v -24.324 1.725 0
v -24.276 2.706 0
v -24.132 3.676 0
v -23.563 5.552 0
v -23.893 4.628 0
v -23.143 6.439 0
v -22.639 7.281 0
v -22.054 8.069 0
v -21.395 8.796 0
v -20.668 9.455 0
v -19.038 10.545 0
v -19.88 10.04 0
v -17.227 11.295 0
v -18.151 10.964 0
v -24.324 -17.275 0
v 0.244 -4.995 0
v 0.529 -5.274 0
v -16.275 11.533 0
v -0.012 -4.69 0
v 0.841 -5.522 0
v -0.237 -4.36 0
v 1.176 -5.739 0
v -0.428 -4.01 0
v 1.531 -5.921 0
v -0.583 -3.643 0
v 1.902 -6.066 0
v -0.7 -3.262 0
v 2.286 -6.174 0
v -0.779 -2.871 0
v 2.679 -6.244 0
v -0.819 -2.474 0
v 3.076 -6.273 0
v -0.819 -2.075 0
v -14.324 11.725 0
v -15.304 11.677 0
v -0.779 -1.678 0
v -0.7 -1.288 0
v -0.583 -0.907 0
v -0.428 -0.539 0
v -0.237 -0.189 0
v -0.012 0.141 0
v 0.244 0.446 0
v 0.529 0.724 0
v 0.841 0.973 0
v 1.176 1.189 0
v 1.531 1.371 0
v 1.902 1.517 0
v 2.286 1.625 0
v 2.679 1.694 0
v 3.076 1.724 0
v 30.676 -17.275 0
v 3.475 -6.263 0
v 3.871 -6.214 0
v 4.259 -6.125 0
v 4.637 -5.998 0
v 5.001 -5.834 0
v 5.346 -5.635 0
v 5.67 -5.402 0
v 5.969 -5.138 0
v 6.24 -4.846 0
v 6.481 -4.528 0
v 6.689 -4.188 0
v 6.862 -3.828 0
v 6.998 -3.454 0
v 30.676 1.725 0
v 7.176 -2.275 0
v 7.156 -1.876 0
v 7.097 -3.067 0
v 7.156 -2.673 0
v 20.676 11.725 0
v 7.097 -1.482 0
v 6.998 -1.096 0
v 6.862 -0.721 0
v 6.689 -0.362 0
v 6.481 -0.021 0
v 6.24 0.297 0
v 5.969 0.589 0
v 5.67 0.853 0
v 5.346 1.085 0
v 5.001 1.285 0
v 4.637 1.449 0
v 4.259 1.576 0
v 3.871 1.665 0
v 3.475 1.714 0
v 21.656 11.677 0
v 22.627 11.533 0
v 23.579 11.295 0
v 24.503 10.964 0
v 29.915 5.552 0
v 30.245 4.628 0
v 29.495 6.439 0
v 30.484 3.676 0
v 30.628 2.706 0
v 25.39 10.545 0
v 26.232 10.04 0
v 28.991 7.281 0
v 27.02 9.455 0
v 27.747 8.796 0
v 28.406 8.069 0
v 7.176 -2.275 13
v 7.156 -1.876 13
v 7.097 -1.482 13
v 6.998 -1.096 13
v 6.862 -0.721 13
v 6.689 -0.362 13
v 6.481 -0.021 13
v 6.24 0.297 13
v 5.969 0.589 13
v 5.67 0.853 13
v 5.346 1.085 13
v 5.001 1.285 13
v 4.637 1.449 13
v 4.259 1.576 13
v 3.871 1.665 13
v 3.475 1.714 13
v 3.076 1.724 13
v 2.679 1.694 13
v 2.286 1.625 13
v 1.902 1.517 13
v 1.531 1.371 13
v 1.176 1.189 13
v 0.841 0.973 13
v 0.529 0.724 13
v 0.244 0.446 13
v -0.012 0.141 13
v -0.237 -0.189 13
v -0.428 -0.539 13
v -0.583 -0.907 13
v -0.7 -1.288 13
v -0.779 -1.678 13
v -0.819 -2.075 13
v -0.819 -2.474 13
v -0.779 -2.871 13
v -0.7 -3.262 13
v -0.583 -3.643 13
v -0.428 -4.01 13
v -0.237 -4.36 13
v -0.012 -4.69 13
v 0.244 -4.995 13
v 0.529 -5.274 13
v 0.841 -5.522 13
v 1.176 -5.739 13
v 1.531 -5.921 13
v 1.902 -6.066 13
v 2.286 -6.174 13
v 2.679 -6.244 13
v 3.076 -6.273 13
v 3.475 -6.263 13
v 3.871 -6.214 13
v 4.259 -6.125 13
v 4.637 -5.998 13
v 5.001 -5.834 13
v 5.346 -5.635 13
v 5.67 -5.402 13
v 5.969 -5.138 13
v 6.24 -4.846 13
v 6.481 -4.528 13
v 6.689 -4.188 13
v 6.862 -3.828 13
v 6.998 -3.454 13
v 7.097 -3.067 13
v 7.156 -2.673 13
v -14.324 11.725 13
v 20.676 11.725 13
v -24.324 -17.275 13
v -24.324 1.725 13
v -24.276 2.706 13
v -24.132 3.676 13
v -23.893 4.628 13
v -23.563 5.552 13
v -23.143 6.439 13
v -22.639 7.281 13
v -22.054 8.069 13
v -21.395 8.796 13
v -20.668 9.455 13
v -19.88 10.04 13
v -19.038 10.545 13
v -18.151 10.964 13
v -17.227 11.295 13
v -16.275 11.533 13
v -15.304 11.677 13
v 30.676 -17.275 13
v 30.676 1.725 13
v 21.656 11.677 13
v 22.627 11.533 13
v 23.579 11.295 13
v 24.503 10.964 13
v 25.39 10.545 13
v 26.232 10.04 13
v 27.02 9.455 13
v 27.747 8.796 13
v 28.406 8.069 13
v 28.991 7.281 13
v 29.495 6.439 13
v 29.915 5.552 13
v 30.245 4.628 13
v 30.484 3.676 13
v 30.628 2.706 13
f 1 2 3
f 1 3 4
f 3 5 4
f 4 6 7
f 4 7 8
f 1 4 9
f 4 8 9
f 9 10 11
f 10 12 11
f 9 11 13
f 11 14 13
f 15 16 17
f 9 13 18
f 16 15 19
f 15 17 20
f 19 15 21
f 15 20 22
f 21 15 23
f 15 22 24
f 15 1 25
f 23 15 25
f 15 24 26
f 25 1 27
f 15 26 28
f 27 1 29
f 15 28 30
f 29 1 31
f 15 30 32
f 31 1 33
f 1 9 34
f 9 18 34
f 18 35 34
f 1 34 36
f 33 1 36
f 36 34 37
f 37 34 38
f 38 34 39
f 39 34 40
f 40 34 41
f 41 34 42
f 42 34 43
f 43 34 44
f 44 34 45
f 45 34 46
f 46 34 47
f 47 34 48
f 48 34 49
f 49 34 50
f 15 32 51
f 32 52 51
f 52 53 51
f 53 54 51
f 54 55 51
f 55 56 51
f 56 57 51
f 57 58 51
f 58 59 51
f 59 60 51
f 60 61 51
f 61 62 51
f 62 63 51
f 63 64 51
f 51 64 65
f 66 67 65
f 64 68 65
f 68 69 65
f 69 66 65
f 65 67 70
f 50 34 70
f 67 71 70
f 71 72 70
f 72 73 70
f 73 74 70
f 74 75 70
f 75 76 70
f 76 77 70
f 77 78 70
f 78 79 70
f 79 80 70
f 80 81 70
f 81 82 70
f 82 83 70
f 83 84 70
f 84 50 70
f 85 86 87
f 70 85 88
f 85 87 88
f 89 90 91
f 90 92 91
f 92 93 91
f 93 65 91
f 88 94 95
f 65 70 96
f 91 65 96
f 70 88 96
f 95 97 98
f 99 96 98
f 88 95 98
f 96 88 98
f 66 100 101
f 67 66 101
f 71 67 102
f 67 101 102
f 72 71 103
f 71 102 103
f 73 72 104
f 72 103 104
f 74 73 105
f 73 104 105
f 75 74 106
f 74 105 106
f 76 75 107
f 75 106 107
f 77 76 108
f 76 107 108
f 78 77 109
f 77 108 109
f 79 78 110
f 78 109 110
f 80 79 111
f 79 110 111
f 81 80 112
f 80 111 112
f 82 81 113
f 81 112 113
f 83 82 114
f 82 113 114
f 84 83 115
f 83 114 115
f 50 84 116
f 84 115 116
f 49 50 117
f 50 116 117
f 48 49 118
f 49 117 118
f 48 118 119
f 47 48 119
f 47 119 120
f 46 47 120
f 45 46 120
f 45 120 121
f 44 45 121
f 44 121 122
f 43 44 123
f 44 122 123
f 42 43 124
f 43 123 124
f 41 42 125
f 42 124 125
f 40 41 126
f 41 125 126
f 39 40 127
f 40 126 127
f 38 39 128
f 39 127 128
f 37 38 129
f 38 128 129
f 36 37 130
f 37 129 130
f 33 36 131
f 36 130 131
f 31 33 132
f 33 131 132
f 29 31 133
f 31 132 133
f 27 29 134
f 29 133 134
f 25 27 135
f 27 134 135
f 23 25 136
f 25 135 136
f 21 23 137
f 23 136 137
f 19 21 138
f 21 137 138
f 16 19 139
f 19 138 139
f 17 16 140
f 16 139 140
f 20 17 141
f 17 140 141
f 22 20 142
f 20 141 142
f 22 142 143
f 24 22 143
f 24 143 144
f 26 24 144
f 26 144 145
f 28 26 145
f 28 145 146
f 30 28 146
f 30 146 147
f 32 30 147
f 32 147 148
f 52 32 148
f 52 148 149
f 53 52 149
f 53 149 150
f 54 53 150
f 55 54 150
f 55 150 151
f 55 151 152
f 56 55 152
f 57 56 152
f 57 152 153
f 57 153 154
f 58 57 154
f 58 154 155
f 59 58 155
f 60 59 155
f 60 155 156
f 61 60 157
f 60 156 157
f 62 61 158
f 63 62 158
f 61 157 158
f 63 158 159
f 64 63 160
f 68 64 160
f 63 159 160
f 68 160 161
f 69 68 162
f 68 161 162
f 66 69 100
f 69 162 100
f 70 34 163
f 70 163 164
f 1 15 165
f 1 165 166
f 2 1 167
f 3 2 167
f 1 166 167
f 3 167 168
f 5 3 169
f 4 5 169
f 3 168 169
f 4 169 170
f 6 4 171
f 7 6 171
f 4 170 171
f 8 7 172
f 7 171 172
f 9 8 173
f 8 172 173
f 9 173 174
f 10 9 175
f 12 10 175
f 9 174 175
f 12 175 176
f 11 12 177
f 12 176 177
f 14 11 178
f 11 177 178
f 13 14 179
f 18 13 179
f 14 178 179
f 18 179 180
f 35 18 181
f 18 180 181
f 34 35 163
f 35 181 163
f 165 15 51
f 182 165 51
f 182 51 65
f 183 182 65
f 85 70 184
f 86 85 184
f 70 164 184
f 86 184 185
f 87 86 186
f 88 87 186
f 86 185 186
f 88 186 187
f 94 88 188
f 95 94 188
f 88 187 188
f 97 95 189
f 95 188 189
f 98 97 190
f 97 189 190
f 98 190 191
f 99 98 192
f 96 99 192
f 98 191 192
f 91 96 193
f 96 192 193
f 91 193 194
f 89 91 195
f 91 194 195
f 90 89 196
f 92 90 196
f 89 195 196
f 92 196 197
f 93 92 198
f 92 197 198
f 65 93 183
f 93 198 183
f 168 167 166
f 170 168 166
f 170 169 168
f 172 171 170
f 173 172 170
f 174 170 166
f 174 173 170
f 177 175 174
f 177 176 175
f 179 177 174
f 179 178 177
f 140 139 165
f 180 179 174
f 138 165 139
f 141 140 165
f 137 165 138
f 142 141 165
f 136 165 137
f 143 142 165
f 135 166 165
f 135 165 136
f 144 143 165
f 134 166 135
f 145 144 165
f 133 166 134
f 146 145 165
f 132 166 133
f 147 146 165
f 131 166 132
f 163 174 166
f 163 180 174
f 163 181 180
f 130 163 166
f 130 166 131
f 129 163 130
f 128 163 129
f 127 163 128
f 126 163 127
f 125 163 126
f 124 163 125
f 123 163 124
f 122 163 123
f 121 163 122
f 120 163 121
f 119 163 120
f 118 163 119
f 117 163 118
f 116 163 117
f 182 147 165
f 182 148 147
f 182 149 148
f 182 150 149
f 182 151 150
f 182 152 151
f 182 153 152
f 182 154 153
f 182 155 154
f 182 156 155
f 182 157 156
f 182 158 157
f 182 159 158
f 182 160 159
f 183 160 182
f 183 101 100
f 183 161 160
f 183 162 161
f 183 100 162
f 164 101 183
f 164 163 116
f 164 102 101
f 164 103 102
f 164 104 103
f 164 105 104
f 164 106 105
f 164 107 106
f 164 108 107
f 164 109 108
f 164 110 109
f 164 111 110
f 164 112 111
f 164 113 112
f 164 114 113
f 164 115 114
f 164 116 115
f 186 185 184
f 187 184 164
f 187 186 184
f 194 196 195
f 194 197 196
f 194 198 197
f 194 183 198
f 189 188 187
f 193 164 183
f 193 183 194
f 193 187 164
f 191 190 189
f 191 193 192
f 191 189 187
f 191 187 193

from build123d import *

# Parameters (mm, degrees)
SKETCH_1_W           = 55
SKETCH_1_H           = 29
EXTRUDE_1_DEPTH      = 13
SKETCH_2_OUTSIDE_W   = 69.704
SKETCH_2_OUTSIDE_H   = 43.704
SKETCH_2_OUTSIDE_W_2 = 55
SKETCH_2_OUTSIDE_H_2 = 29
SKETCH_2_OUTSIDE_R   = 4
CUT_EXTRUDE_1_DEPTH  = 13
FILLET_1_R           = 10


with BuildPart() as part:
    # 草图1 → 凸台-拉伸1 (new body)
    with BuildSketch(Plane.XY):
        with Locations((3.176056338, -2.774647887)):
            Rectangle(SKETCH_1_W, SKETCH_1_H)
    extrude(amount=EXTRUDE_1_DEPTH)

    # 草图2 outside → 切除-拉伸1 (cut)
    with BuildSketch(Plane.XY.offset(13)):
        with Locations((3.176, -2.775)):
            Rectangle(SKETCH_2_OUTSIDE_W, SKETCH_2_OUTSIDE_H)
        with Locations((3.176056338, -2.774647887)):
            Rectangle(SKETCH_2_OUTSIDE_W_2, SKETCH_2_OUTSIDE_H_2, mode=Mode.SUBTRACT)
        with Locations((3.176056338, -2.274647887)):
            Circle(SKETCH_2_OUTSIDE_R)
    extrude(amount=-CUT_EXTRUDE_1_DEPTH, mode=Mode.SUBTRACT)

    # 圆角1
    fillet_1_edges = [part.edges().sort_by_distance(p)[0] for p in [
        (-24.323943662, 11.725352113, 6.5),
        (30.676056338, 11.725352113, 6.5),
    ]]
    fillet(fillet_1_edges, radius=FILLET_1_R)


solid = part.part
